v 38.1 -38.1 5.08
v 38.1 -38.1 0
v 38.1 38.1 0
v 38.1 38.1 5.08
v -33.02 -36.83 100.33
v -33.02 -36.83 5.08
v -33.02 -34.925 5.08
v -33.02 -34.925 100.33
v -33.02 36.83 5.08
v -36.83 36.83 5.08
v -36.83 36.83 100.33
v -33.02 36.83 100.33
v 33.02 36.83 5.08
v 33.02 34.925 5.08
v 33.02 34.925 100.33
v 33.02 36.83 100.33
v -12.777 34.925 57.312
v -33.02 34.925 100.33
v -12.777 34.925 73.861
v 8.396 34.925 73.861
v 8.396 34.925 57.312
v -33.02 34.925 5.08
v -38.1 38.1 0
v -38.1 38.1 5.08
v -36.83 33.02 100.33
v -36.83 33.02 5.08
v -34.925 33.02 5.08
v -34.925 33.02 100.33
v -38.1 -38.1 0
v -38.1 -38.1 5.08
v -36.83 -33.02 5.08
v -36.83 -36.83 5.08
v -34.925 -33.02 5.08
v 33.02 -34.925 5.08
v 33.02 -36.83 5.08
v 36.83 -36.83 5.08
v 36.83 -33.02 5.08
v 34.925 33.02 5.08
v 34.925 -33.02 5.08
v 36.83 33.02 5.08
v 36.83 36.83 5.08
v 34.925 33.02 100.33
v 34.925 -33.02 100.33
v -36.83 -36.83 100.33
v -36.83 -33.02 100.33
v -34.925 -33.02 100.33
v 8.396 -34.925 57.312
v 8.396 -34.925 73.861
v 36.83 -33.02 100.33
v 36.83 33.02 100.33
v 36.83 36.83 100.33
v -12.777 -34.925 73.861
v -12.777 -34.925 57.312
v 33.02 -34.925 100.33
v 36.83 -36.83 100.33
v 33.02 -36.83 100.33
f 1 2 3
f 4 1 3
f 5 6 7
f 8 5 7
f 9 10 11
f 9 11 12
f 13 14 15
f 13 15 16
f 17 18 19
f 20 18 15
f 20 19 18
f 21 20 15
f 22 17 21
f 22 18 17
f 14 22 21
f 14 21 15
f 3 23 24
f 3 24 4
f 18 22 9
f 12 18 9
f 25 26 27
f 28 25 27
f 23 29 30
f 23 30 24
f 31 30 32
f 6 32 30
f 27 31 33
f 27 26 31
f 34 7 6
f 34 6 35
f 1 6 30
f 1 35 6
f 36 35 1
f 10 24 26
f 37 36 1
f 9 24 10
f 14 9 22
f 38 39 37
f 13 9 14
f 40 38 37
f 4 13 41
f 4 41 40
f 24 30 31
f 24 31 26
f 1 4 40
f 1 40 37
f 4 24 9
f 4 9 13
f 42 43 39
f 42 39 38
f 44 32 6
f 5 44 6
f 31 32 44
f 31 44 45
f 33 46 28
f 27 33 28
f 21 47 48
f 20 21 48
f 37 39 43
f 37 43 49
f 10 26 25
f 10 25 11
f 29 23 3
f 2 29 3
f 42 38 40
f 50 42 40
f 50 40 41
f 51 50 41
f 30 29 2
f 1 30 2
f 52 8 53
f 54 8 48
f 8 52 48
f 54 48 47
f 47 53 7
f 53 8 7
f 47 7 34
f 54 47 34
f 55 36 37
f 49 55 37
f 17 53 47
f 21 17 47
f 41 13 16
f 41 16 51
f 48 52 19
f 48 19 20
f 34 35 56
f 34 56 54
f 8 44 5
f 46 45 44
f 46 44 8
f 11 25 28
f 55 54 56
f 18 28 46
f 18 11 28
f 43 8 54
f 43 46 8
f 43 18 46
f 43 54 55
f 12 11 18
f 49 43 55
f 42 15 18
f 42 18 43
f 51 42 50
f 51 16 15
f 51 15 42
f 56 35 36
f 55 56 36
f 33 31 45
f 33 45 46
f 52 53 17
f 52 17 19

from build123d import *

# Parameters (mm, degrees)
F0_W     = 76.2
F0_H     = 76.2
F1_DEPTH = 5.08
F2_W     = 69.85
F2_H     = 69.85
F3_DEPTH = 95.25
F4_W     = 3.81
F4_H     = 3.81
F5_DEPTH = 100.33
F6_W     = 21.172609
F6_H     = 16.548711
F7_DEPTH = 73.026


with BuildPart() as f1:
    # F0 (on Top) → F1 (new body)
    with BuildSketch(Plane.XY):
        Rectangle(F0_W, F0_H)
    extrude(amount=F1_DEPTH)

    # F2 (on face) → F3 (join)
    with BuildSketch(Plane.XY.offset(5.08)):
        Rectangle(F2_W, F2_H)
    extrude(amount=F3_DEPTH)

    # F4 (on Top) → F5 (join)
    with BuildSketch(Plane.XY):
        with Locations((34.925, -34.925)):
            Rectangle(F4_W, F4_H)
        with Locations((-34.925, -34.925)):
            Rectangle(F4_W, F4_H)
        with Locations((-34.925, 34.925)):
            Rectangle(F4_W, F4_H)
        with Locations((34.925, 34.925)):
            Rectangle(F4_W, F4_H)
    extrude(amount=F5_DEPTH)

    # F6 (on face) → F7 (cut, through all)
    with BuildSketch(Plane.XZ.offset(34.925)):
        with Locations((-2.19027, 65.586423)):
            Rectangle(F6_W, F6_H)
    extrude(amount=-F7_DEPTH, mode=Mode.SUBTRACT)


solid = f1.part
